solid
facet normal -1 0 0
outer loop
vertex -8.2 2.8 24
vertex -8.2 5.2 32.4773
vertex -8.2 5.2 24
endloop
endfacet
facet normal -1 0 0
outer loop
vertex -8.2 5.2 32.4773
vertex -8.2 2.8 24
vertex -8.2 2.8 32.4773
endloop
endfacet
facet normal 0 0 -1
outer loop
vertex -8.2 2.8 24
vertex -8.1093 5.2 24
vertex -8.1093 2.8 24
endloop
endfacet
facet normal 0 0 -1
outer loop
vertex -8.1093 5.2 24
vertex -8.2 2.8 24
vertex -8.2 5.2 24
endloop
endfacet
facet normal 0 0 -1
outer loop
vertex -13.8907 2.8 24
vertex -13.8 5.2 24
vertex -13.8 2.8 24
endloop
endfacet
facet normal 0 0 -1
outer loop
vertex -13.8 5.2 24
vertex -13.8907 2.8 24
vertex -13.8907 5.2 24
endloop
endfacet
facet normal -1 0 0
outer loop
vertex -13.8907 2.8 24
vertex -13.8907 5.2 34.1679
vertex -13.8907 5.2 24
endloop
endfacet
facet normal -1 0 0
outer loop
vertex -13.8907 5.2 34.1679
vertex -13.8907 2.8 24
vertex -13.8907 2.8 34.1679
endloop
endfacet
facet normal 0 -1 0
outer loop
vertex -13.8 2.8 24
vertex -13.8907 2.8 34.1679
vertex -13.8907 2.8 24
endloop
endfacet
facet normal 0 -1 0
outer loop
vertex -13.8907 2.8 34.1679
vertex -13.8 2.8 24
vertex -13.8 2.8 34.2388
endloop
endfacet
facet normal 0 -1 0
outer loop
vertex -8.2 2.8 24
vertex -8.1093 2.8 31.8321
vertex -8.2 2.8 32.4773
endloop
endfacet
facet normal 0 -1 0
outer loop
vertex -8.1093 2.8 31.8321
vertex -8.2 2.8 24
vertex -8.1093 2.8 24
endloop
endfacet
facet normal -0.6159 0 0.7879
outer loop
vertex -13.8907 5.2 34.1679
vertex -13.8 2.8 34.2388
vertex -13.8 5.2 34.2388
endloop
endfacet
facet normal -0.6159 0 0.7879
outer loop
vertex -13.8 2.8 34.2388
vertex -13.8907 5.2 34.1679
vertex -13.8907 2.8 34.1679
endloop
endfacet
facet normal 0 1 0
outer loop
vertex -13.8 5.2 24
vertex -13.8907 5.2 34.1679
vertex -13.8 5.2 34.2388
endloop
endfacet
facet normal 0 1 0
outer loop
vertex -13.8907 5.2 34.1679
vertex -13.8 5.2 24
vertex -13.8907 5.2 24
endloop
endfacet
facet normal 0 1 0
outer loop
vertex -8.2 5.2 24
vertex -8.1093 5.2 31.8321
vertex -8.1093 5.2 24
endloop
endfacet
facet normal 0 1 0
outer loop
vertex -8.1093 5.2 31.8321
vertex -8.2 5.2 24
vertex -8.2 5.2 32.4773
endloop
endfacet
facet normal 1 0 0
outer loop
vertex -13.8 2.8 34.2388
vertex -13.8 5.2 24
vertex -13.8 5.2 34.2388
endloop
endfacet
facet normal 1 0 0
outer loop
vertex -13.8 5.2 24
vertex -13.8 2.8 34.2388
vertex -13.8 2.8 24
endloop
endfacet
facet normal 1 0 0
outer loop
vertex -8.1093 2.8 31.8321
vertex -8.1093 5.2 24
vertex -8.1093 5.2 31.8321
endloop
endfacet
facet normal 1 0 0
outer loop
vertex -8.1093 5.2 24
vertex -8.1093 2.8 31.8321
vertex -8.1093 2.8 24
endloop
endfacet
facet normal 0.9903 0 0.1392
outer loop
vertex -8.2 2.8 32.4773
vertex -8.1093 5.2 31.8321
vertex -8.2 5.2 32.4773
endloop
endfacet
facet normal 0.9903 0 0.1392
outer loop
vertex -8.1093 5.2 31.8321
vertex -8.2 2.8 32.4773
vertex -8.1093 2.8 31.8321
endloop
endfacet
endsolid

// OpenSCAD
// The payload nuts (port bracket / flexure bolts) must not spin: a real M3
// nut (5.4 AF, measured) turned 8 deg in each payload nut slot, swept down
// through the slot's open bottom, must hit the slot walls.
// Must render NON-empty.
include <../stage.scad>
af = 5.4;
module swept(p) hull() for (dz = [0, -zs_h])
  translate([xs_xc + p[0], payload_face_y - 4, stage_payload_z + p[1] + dz]) rotate([90, 0, 0]) rotate([0, 0, 90 + 8])
    cylinder(d = af / cos(30), h = 2.4, center = true, $fn = 6);
// both slots must grip: intersect slot A's hits with slot B's hits moved onto A
intersection() {
  intersection() { stage_z_slider(); swept(payload_pts[0]); }
  translate([payload_pts[0][0] - payload_pts[1][0], 0, payload_pts[0][1] - payload_pts[1][1]])
    intersection() { stage_z_slider(); swept(payload_pts[1]); }
}
